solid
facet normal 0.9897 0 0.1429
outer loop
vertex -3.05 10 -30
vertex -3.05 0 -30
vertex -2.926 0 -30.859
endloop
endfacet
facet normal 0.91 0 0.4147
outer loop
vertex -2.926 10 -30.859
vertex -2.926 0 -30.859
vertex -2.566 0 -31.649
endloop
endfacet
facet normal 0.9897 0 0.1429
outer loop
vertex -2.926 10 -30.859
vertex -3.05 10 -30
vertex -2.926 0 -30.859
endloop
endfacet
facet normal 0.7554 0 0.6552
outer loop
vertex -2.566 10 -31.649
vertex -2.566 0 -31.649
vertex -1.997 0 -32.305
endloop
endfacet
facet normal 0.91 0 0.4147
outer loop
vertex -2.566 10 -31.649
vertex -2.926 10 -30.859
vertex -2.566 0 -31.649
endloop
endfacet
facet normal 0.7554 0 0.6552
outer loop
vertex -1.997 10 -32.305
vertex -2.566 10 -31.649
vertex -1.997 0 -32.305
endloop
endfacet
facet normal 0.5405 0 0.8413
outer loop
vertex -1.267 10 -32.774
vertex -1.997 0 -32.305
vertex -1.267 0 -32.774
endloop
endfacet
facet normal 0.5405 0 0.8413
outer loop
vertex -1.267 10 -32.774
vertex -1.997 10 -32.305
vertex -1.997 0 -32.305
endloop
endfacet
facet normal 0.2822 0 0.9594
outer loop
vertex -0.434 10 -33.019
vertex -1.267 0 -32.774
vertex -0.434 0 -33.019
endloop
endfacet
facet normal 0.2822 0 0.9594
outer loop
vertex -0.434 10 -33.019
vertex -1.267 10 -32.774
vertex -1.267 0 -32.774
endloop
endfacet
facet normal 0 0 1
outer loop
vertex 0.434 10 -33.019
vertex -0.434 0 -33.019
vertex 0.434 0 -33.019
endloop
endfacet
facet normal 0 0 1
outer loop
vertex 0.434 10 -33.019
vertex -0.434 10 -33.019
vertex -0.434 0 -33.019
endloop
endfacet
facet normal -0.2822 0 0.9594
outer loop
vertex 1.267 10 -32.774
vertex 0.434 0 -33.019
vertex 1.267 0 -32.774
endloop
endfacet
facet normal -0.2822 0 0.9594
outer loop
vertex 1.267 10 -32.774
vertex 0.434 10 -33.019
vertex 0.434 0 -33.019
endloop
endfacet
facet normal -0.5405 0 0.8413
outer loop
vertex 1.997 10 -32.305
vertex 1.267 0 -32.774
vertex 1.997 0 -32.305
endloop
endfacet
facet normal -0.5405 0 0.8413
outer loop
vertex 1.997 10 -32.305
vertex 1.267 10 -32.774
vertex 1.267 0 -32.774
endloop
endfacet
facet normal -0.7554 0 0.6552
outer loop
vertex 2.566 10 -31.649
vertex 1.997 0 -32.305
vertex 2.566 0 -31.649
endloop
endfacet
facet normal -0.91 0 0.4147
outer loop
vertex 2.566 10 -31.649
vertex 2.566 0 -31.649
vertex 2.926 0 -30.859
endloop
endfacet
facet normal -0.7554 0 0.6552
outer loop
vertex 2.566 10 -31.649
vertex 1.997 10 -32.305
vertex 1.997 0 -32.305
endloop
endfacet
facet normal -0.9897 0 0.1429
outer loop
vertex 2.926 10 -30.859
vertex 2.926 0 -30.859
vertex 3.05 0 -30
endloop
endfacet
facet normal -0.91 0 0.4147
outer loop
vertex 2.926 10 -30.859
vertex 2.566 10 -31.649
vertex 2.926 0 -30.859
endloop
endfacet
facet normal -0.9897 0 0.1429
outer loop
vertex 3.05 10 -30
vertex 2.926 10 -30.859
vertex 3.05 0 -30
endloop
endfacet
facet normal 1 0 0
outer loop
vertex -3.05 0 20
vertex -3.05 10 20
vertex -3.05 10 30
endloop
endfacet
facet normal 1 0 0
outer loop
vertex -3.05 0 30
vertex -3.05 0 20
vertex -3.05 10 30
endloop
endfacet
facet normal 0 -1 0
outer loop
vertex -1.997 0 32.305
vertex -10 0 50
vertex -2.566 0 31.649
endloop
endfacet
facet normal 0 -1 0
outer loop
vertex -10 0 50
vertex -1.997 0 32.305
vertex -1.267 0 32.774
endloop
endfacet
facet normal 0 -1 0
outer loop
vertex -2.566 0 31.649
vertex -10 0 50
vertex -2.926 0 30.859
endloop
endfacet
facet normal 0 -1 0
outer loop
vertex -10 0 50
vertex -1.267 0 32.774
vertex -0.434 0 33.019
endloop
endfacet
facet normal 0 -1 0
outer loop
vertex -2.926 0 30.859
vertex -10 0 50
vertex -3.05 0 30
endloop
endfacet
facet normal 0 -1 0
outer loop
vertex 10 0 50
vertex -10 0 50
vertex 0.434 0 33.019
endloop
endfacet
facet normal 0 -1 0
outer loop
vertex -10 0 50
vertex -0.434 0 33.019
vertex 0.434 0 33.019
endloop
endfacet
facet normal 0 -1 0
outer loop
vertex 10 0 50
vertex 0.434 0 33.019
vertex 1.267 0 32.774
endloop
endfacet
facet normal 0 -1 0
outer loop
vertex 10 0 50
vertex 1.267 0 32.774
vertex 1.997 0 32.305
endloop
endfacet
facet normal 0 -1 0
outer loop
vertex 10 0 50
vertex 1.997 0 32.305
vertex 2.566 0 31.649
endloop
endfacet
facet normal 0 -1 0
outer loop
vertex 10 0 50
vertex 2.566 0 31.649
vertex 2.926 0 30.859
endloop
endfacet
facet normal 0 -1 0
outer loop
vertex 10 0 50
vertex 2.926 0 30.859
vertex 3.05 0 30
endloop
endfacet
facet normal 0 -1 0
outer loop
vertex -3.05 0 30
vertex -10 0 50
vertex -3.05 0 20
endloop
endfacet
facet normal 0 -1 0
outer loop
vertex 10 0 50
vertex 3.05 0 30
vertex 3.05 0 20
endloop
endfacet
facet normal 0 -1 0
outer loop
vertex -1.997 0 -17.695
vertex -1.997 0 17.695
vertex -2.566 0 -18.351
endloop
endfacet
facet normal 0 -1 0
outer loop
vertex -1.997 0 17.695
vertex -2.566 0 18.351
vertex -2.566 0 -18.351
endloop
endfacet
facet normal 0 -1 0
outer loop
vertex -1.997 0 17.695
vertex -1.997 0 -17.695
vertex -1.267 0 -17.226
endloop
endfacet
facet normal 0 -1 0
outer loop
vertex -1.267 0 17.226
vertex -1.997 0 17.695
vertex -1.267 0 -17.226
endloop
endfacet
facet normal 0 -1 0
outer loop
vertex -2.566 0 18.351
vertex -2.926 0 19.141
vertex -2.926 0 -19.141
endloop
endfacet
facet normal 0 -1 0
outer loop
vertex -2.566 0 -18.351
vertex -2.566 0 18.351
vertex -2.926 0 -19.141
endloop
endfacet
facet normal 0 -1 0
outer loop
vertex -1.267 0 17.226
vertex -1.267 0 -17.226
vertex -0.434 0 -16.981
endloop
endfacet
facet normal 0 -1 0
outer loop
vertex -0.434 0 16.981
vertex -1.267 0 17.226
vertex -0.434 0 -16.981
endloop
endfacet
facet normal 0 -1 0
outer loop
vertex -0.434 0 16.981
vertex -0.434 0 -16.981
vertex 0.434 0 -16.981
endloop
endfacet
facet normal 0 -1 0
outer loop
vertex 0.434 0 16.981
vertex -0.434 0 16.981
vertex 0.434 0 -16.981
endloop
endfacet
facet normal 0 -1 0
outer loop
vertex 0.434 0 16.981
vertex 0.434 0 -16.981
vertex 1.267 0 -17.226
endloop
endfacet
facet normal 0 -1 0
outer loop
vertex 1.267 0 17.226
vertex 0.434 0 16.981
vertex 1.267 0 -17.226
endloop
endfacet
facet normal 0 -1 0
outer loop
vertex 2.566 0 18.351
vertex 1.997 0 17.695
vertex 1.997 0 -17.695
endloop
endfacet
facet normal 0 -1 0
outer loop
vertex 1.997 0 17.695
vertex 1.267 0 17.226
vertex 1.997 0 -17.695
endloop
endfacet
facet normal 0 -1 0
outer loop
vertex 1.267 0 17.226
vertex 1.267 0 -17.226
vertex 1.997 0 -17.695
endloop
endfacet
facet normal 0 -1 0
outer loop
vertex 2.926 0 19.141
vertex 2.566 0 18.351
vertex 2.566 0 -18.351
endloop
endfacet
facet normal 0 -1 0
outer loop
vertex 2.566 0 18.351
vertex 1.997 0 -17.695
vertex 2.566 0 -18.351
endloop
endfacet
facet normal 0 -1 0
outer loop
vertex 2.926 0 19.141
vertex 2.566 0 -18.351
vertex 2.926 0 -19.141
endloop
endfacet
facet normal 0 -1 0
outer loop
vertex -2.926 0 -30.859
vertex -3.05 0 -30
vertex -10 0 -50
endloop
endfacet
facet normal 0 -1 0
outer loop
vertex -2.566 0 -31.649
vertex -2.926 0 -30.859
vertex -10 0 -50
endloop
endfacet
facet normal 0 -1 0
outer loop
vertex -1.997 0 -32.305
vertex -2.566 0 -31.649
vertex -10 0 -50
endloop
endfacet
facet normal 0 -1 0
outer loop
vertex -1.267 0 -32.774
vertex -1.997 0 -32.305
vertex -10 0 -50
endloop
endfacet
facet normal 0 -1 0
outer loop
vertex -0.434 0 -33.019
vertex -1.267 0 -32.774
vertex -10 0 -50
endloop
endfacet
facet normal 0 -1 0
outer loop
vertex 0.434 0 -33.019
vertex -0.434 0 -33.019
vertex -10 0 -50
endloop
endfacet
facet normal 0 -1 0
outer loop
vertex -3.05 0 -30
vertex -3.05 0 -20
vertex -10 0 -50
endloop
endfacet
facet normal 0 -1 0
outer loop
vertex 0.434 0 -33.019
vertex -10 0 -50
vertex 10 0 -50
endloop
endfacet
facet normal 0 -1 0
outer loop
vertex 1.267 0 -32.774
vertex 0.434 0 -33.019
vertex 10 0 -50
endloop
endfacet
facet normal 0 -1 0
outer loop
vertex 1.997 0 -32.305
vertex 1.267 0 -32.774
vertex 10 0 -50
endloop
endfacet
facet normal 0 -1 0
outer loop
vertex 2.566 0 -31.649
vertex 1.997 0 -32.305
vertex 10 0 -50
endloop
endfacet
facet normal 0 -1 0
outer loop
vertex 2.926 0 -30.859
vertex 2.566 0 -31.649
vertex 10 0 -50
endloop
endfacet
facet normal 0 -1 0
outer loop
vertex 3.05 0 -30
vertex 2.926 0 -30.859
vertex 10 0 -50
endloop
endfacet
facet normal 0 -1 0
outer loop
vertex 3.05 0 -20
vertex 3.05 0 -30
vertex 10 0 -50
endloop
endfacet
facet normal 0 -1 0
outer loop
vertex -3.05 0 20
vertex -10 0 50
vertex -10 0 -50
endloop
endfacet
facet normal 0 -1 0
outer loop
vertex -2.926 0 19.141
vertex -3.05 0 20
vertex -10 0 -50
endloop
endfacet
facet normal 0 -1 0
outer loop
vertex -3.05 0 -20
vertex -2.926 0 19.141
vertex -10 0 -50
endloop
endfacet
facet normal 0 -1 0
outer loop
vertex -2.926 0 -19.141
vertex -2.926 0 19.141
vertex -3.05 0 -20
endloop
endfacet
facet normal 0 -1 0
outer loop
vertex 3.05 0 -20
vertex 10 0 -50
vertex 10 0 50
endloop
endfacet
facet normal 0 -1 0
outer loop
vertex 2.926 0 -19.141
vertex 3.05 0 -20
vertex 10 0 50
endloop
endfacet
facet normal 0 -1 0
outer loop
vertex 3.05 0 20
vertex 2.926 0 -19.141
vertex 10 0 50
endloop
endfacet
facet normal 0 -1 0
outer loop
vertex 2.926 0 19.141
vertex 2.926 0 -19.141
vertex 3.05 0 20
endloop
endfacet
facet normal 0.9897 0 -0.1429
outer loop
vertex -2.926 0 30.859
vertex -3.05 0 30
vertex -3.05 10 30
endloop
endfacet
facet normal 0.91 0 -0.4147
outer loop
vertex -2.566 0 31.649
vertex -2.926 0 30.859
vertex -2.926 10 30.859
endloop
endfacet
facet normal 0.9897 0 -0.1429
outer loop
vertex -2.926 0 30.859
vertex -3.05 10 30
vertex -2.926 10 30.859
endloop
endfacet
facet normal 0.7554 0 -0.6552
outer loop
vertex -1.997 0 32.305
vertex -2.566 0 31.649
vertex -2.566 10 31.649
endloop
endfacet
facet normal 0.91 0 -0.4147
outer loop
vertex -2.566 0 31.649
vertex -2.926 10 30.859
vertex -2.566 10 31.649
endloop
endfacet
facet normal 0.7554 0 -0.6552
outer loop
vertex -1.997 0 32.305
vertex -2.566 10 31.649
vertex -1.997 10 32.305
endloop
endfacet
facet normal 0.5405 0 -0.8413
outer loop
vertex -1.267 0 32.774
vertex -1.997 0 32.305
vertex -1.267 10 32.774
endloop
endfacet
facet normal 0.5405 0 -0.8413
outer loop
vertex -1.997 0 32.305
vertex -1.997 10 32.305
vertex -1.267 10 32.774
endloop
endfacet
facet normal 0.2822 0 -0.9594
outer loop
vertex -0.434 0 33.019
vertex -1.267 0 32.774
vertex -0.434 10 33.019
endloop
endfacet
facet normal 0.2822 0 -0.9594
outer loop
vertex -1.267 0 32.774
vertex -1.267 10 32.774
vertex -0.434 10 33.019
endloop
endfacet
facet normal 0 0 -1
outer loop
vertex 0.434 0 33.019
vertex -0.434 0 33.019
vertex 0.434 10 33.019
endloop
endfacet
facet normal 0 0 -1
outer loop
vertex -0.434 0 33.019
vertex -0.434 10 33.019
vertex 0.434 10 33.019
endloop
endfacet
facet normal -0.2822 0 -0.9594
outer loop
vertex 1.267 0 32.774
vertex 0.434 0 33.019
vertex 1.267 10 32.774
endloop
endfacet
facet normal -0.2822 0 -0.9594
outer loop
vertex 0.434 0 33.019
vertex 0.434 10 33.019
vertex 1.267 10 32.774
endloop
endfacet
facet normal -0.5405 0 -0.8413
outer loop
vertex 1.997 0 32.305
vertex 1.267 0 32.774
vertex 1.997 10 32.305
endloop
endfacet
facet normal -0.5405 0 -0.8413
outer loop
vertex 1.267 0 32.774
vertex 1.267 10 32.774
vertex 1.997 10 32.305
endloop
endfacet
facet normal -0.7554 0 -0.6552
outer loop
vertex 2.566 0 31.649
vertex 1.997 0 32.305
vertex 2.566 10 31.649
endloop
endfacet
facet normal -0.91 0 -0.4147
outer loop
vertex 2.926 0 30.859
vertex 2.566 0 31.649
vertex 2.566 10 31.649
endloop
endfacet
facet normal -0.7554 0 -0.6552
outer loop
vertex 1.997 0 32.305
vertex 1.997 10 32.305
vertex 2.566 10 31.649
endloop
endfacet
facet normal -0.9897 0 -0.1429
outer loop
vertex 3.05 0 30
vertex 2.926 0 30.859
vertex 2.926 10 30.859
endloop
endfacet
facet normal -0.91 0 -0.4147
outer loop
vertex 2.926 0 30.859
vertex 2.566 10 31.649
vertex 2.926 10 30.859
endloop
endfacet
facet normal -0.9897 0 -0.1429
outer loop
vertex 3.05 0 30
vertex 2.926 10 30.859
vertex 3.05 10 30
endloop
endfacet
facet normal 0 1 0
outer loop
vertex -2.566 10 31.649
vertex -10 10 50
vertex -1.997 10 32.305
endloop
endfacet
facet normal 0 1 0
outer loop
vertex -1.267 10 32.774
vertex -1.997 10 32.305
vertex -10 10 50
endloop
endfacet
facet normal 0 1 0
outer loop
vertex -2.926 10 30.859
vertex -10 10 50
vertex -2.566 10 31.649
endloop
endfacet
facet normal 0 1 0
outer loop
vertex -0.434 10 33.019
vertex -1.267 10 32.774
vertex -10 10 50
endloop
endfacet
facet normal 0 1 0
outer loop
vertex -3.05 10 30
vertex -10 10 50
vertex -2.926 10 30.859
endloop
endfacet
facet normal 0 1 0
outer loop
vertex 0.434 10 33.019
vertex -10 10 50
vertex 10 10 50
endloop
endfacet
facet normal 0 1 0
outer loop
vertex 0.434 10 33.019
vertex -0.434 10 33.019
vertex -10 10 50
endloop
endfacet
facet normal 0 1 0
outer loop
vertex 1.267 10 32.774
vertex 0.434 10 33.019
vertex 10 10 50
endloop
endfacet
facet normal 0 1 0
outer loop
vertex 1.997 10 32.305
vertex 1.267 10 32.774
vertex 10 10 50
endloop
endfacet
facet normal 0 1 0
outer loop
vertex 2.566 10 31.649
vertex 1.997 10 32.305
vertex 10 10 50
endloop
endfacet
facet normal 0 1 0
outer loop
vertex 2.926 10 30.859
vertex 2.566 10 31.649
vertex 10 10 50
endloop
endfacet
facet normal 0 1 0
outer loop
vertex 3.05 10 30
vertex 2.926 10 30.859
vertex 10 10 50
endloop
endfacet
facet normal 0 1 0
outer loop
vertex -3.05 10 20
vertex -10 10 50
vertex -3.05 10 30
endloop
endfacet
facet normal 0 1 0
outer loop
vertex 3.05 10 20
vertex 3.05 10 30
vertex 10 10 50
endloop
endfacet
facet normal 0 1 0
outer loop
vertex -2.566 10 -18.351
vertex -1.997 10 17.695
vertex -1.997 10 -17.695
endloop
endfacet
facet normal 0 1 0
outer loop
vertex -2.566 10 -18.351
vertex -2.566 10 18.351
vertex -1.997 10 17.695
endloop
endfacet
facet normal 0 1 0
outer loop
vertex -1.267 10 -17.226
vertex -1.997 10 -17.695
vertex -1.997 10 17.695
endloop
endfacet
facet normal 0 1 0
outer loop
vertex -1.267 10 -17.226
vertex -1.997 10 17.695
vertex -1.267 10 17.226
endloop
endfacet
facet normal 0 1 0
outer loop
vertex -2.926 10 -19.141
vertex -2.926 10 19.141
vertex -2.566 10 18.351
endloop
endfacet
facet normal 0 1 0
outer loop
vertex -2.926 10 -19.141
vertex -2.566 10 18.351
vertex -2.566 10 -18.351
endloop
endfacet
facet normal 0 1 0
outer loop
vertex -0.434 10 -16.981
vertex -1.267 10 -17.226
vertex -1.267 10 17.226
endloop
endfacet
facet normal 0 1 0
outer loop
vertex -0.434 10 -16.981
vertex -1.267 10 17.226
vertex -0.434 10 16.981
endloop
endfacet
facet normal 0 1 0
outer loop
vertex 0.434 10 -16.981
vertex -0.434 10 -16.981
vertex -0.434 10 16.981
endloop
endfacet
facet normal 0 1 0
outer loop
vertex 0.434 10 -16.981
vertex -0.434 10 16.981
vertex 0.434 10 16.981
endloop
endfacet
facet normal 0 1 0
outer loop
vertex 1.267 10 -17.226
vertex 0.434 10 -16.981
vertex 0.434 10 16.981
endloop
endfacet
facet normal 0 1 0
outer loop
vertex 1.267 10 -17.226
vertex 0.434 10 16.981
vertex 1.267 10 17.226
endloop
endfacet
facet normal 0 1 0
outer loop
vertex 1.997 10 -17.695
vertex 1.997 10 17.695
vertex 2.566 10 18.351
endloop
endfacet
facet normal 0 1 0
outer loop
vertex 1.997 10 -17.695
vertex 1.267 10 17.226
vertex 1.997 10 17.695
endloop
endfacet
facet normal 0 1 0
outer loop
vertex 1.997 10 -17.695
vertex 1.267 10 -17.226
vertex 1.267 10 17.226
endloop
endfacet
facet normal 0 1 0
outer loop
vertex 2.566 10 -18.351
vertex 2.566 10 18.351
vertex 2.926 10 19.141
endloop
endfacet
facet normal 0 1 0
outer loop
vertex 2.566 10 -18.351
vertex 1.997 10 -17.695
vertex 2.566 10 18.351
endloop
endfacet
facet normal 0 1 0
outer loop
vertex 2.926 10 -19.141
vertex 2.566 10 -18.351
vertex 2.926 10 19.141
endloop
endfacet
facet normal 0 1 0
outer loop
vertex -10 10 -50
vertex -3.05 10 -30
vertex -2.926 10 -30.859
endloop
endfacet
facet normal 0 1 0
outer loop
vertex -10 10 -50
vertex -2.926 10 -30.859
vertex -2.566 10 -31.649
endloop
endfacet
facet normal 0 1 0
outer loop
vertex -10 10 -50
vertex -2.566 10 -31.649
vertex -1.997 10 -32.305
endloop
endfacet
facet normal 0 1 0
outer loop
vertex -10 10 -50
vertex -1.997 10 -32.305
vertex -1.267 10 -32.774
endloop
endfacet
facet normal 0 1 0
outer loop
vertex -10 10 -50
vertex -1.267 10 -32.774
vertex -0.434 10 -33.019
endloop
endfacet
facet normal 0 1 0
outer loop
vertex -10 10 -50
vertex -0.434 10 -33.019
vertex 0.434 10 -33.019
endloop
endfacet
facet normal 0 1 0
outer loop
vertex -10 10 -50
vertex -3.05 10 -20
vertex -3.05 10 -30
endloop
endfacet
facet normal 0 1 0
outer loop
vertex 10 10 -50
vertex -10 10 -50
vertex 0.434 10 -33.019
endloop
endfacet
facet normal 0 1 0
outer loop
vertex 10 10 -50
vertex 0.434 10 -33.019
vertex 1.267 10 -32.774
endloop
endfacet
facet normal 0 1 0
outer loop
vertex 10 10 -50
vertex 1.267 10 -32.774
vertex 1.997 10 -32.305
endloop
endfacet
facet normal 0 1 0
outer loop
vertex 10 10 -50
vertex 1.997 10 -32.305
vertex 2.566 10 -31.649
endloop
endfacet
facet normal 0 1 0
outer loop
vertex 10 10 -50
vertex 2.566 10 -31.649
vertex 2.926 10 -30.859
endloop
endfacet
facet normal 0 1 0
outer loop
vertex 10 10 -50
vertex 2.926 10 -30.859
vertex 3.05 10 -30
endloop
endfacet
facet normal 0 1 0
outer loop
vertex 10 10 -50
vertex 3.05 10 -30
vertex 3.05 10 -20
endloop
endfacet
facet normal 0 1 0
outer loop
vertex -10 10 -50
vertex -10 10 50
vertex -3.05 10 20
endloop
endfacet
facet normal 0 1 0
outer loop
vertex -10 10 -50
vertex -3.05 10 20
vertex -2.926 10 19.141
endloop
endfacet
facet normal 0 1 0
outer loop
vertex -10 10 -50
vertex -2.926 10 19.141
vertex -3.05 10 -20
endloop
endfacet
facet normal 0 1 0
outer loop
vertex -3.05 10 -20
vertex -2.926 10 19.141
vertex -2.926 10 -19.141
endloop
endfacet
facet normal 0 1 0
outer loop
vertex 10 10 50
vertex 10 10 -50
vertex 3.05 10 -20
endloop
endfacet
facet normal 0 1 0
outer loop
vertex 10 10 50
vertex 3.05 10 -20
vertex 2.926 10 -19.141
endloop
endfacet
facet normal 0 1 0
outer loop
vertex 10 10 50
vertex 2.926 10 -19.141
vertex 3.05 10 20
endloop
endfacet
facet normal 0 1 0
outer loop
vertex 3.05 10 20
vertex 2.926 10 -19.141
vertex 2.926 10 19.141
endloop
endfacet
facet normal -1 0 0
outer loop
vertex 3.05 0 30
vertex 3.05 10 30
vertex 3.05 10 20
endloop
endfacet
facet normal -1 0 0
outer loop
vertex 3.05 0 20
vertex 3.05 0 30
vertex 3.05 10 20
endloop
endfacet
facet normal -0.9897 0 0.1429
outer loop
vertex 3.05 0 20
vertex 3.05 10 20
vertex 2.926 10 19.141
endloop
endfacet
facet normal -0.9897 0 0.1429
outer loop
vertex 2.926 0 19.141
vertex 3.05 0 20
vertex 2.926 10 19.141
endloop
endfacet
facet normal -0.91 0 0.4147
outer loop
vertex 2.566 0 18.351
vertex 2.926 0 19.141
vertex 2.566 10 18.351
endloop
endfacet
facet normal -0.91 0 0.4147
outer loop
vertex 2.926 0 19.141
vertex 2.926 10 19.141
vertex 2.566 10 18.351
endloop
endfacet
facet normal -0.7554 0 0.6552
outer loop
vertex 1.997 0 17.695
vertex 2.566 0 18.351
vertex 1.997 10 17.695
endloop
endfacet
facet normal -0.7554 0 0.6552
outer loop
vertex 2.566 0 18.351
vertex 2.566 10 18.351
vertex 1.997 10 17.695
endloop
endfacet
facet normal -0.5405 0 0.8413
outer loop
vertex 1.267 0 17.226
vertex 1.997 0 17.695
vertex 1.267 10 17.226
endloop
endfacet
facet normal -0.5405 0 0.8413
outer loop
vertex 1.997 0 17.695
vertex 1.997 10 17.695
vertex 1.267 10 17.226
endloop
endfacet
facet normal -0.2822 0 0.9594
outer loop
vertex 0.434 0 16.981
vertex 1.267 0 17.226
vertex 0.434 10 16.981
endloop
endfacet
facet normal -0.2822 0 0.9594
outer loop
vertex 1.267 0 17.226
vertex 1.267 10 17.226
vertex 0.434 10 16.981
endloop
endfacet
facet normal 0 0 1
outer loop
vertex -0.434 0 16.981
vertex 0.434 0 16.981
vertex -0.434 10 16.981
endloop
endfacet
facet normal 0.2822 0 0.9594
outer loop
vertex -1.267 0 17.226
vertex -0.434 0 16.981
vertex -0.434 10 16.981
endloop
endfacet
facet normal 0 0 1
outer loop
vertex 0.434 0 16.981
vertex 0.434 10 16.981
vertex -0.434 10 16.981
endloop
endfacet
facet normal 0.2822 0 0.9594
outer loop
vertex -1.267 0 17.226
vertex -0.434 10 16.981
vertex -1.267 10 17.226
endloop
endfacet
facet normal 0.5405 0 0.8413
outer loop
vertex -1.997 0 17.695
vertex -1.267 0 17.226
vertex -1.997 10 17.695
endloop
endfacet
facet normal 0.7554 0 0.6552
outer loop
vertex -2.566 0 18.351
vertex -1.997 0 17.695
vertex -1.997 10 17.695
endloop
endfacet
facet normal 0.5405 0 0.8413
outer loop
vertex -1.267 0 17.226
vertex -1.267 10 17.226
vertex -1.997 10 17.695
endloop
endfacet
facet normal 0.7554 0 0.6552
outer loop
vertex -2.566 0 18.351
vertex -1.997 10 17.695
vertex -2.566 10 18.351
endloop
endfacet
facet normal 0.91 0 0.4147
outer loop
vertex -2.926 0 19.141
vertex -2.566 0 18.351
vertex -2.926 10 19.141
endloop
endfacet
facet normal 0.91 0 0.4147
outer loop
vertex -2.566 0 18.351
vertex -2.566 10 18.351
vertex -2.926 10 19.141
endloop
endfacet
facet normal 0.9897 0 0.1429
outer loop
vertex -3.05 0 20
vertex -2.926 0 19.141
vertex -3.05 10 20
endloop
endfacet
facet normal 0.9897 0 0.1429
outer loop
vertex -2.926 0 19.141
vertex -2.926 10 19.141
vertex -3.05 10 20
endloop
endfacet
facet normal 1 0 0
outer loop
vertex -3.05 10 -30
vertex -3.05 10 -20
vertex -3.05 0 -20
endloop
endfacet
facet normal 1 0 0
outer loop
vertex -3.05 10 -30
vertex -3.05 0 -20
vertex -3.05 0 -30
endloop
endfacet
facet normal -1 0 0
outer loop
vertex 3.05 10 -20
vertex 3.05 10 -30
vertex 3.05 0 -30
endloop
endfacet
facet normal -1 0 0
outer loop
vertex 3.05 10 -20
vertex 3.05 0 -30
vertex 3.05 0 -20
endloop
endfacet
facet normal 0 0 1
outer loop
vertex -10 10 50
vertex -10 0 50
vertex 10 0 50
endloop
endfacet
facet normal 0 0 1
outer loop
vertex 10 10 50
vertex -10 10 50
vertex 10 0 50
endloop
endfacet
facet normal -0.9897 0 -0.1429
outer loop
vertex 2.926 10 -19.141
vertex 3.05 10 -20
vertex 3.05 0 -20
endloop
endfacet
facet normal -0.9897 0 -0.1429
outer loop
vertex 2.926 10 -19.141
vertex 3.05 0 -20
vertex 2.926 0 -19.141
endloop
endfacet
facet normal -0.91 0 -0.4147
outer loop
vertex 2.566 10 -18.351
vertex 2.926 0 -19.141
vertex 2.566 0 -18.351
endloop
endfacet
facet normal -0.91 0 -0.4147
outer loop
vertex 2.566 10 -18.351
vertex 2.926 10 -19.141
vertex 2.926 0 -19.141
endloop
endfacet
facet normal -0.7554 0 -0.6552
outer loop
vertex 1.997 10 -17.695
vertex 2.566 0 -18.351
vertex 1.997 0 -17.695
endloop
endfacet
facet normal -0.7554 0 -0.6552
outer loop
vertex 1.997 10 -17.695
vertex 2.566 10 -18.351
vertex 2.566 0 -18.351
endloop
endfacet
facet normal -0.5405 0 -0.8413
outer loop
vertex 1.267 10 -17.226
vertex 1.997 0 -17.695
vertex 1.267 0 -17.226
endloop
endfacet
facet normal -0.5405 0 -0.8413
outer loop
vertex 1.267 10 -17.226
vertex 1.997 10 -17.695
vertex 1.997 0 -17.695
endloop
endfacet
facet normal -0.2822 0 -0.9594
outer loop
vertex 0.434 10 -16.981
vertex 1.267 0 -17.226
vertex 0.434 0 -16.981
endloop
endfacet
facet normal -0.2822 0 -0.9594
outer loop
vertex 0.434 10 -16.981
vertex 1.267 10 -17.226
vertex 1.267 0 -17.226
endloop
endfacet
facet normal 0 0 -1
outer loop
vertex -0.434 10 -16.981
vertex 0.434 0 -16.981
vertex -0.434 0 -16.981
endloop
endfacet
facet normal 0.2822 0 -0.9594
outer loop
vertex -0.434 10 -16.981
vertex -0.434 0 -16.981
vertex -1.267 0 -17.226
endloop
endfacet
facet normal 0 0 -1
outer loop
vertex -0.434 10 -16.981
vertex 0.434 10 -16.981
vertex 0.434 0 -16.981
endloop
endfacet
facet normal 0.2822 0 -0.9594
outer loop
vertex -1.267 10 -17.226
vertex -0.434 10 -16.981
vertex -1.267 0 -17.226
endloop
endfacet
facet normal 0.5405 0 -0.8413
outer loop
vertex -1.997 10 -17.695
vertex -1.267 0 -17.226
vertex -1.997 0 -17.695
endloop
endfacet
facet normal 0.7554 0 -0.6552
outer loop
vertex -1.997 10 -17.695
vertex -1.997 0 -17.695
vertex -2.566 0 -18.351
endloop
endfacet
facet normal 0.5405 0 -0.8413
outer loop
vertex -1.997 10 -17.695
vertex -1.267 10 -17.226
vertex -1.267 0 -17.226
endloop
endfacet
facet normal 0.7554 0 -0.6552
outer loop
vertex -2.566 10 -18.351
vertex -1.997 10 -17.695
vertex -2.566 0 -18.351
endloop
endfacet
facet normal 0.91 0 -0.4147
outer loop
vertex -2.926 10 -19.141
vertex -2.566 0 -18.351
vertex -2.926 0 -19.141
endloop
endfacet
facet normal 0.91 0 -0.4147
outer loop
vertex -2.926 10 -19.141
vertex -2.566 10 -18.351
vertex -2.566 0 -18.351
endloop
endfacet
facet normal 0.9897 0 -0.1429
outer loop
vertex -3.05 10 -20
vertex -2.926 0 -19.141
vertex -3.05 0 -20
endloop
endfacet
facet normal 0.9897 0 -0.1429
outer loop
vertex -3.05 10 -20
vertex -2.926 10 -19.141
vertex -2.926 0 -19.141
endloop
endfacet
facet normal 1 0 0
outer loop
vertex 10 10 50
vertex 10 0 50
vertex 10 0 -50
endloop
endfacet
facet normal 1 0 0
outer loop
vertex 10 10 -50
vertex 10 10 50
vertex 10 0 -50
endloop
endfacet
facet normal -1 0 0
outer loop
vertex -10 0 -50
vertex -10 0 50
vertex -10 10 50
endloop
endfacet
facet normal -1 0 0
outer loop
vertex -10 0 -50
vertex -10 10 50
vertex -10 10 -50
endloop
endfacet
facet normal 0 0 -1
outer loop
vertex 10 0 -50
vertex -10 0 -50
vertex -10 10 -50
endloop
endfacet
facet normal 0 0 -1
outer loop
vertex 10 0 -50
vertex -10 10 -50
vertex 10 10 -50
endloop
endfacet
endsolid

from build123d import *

# Parameters (mm, degrees)
SKETCH1_W           = 20
SKETCH1_H           = 100
BOSS_EXTRUDE1_DEPTH = 10
CUT_EXTRUDE1_DEPTH  = 10


with BuildPart() as part:
    # Sketch1 → Boss-Extrude1 (new body)
    with BuildSketch(Plane(origin=(0, 0, 0), x_dir=(1, 0, 0), z_dir=(0, 1, 0))):
        Rectangle(SKETCH1_W, SKETCH1_H)
    extrude(amount=BOSS_EXTRUDE1_DEPTH)

    # Sketch2 → Cut-Extrude1 (cut)
    with BuildSketch(Plane(origin=(0, 10, 0), x_dir=(1, 0, 0), z_dir=(0, 1, 0))):
        with BuildLine():
            Line((3.05, 30), (3.05, 20))
            ThreePointArc((3.05, 20), (0, 16.95), (-3.05, 20))
            Line((-3.05, 20), (-3.05, 30))
            ThreePointArc((-3.05, 30), (0, 33.05), (3.05, 30))
        make_face()
    cut_extrude1 = extrude(amount=-CUT_EXTRUDE1_DEPTH, mode=Mode.SUBTRACT)

    # Mirror1: Cut-Extrude1 across plane
    add(cut_extrude1.mirror(Plane.XY), mode=Mode.SUBTRACT)


solid = part.part
